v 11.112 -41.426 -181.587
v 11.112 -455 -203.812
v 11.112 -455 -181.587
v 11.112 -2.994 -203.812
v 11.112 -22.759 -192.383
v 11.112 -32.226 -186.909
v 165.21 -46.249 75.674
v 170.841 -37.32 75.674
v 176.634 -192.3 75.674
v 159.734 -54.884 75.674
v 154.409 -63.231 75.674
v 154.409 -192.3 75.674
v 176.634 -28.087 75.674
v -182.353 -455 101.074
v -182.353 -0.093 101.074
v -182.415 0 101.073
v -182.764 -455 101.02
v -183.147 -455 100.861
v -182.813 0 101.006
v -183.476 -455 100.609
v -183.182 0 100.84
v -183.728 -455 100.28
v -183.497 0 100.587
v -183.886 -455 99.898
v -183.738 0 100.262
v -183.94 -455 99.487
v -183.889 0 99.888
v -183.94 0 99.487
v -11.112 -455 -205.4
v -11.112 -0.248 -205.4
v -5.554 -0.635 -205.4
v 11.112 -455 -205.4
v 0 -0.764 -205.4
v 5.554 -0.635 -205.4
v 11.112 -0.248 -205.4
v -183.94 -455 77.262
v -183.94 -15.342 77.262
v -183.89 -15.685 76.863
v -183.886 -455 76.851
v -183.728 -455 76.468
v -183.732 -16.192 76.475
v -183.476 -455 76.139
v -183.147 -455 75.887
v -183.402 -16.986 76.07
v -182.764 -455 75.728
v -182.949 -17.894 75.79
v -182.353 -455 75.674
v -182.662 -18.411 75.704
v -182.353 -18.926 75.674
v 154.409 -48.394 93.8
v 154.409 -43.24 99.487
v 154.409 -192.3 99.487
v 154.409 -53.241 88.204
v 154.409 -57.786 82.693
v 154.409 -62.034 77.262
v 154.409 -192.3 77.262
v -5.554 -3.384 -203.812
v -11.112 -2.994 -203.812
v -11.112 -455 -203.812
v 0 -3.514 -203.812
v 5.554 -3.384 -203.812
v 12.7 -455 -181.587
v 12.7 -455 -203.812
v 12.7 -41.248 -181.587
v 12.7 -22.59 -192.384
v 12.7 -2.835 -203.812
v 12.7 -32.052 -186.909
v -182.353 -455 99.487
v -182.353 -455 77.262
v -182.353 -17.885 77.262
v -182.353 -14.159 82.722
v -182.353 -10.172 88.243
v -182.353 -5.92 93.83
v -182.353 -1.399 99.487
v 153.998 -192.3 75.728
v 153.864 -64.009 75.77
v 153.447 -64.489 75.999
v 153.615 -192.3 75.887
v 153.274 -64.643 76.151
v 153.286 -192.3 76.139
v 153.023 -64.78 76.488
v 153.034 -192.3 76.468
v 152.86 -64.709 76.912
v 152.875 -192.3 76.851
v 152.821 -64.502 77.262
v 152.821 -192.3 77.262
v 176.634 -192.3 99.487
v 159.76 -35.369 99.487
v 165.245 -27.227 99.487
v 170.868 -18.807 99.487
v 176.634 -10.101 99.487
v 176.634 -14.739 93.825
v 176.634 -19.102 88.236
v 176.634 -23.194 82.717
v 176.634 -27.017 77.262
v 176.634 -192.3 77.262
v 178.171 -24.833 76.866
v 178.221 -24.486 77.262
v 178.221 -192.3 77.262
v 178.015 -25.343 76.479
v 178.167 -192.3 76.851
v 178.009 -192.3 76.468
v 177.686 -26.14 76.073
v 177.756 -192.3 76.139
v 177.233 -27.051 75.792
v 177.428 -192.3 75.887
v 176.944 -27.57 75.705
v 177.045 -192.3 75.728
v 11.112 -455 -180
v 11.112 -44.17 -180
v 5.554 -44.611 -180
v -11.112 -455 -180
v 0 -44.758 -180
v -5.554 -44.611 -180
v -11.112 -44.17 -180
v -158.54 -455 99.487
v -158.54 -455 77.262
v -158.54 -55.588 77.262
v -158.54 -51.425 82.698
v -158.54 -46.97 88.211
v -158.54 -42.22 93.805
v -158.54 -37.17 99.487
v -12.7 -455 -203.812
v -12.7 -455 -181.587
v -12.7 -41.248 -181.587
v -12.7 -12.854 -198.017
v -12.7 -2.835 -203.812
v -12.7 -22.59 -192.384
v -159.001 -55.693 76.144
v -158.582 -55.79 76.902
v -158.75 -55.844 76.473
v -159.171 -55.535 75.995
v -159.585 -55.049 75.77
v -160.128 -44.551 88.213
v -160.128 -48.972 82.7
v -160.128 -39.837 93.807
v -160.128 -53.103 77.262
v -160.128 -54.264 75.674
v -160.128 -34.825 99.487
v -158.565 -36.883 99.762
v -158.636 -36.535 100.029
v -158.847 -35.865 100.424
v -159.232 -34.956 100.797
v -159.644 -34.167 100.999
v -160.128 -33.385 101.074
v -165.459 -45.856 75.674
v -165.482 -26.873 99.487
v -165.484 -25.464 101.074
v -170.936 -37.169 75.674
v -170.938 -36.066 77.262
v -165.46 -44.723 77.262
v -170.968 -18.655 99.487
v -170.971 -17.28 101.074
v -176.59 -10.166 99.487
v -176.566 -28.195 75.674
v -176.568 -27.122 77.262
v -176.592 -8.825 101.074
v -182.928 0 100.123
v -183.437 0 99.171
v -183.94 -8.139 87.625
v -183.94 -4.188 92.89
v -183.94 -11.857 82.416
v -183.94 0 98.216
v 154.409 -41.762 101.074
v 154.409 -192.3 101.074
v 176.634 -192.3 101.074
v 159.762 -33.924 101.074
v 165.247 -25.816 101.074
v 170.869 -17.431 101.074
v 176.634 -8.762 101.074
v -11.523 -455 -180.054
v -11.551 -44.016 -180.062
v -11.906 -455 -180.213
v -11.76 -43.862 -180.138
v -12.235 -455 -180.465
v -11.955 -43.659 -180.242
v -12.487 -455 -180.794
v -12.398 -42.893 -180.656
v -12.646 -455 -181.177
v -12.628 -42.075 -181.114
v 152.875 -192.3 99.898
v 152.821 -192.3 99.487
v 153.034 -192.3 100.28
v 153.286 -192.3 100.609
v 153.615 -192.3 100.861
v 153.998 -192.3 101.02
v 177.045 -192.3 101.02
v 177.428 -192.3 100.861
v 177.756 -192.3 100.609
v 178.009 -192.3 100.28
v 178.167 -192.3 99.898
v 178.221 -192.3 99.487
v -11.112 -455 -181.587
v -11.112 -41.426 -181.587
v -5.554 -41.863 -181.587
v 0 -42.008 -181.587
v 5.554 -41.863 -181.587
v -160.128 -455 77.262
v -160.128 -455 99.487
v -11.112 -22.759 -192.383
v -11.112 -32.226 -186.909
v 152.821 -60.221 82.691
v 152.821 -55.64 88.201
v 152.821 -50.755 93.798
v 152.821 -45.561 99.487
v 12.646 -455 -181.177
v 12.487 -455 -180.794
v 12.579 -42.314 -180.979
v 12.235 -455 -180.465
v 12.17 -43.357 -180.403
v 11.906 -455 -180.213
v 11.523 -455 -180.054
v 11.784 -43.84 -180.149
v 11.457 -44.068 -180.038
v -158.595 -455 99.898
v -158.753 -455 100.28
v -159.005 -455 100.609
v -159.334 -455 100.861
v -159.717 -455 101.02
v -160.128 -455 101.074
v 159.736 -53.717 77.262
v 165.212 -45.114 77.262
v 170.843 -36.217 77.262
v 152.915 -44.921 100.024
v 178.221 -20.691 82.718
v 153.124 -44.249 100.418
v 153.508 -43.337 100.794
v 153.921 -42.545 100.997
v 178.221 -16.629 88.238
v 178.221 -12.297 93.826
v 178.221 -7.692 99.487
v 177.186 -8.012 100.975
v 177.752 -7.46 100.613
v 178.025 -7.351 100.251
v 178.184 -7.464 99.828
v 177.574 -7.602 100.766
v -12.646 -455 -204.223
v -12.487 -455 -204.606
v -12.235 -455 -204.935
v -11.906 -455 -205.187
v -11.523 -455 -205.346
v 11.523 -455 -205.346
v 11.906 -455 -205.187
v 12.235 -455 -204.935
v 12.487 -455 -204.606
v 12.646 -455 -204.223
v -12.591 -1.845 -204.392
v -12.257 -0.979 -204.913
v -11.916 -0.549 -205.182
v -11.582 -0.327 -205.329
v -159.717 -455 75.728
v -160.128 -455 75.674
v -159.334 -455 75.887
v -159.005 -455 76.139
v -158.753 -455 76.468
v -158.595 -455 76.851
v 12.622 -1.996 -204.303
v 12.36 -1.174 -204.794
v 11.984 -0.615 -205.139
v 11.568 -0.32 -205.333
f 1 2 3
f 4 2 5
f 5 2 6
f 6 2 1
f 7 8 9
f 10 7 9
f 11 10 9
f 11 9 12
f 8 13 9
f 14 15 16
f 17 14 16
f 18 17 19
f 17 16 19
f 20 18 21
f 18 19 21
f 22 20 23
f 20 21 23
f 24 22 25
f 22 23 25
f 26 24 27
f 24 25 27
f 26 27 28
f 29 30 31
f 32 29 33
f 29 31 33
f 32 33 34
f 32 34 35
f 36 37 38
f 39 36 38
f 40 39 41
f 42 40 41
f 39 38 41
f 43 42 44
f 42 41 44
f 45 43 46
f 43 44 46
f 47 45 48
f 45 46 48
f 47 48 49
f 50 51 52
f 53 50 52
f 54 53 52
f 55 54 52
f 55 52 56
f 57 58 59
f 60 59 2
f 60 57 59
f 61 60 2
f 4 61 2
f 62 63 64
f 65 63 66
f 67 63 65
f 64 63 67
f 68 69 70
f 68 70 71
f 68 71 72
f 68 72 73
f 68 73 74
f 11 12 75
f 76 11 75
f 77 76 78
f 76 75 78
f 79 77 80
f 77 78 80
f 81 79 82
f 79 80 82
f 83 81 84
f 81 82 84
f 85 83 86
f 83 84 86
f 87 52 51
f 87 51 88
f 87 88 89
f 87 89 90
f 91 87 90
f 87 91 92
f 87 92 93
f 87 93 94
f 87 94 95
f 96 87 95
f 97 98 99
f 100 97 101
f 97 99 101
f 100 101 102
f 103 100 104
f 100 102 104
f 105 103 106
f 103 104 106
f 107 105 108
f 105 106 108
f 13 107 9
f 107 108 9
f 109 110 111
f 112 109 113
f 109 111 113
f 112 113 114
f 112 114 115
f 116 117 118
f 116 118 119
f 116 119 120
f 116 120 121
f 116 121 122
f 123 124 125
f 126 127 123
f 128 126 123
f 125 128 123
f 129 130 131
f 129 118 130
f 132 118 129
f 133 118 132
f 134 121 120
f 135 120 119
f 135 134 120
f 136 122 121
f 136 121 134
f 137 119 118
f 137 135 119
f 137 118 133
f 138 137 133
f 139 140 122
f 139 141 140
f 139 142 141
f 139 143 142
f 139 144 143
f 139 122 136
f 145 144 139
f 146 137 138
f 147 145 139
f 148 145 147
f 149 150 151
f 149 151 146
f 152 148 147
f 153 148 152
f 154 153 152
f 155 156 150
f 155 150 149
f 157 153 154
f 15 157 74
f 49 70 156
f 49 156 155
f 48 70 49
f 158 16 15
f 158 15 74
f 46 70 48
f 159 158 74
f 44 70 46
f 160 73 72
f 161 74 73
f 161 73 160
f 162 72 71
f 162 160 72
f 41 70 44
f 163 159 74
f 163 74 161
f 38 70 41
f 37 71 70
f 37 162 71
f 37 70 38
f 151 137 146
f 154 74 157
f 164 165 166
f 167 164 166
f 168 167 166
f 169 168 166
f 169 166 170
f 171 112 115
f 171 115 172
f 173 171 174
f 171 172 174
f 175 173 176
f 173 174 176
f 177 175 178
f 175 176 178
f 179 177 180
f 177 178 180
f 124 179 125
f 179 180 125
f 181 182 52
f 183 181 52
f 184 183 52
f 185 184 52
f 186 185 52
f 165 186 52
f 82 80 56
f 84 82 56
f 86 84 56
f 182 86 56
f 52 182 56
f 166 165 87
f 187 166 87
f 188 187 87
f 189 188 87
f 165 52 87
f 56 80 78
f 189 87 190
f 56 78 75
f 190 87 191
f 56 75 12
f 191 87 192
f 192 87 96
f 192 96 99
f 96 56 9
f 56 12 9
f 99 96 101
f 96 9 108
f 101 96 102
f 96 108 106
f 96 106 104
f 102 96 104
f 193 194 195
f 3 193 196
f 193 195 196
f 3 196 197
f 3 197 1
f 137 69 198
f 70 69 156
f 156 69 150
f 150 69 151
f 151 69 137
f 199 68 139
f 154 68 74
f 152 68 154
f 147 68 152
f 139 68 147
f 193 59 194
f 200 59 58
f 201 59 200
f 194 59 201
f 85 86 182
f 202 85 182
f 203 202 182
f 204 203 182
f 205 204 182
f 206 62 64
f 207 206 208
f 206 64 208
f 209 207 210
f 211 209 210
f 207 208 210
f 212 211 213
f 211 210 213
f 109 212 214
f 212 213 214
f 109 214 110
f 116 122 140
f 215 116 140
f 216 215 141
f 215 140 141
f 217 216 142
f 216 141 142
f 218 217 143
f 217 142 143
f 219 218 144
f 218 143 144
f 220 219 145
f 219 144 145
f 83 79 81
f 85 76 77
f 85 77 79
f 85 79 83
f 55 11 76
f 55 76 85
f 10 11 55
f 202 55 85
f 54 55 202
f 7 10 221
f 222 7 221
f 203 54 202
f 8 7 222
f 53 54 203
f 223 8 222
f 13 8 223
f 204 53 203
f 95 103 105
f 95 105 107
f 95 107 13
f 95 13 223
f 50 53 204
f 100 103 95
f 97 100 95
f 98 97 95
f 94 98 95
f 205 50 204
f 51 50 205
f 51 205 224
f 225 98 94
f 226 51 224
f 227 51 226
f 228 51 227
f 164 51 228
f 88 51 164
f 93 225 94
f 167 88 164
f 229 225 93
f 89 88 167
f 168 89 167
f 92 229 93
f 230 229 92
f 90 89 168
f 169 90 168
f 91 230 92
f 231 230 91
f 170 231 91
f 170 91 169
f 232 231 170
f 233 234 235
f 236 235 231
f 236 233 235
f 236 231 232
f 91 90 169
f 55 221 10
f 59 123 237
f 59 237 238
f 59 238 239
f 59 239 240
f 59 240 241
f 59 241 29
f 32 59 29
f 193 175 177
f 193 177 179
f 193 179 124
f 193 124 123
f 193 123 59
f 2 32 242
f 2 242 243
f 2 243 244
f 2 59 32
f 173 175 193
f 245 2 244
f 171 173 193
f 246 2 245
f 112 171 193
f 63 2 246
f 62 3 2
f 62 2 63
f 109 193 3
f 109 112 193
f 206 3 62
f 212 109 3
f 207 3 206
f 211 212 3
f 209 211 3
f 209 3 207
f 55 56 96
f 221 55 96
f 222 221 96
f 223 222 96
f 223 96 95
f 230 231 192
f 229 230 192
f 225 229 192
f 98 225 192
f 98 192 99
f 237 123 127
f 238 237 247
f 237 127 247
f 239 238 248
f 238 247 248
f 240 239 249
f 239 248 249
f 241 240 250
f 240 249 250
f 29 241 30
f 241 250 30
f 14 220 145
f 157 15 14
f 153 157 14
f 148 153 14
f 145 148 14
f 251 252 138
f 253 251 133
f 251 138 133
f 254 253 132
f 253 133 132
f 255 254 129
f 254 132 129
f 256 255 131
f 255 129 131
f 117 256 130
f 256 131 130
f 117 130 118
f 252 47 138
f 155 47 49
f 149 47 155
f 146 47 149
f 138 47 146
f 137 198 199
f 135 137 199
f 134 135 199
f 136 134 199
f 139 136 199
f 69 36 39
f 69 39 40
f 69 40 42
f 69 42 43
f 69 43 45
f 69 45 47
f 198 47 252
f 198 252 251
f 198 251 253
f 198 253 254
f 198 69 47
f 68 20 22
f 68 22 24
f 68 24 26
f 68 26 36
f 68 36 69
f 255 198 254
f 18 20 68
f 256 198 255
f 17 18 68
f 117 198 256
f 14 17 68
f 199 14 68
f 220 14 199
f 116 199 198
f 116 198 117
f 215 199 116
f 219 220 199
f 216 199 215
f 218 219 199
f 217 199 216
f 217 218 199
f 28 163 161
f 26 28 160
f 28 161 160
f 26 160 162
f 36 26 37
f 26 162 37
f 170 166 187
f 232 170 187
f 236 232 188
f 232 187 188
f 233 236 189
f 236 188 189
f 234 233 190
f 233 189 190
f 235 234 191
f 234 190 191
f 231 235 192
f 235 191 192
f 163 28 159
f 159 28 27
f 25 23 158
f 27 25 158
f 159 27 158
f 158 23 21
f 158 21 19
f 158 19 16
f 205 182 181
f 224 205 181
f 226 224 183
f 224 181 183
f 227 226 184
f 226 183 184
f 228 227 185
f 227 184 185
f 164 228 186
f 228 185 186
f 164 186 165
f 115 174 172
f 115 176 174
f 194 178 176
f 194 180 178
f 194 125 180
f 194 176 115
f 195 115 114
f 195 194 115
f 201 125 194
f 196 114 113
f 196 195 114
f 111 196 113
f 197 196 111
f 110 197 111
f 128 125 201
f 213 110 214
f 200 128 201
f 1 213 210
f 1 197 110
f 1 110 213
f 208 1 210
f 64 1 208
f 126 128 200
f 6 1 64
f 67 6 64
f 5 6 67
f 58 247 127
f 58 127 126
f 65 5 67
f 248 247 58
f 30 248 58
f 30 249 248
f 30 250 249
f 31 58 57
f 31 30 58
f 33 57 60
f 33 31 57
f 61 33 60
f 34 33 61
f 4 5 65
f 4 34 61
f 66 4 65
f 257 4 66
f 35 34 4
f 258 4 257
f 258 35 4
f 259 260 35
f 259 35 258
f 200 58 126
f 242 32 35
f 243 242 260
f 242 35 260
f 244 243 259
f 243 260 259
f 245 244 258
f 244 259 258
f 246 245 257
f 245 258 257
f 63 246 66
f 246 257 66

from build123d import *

# Parameters (mm, degrees)
CROQUIS11_W                   = 22.225
CROQUIS11_H                   = 22.225
TUBO_CUADRADA_1_X_1_1_DEPTH   = 455
CROQUIS11_ON_SEGMENT_2_W      = 22.225
CROQUIS11_ON_SEGMENT_2_H      = 22.225
TUBO_CUADRADA_1_X_1_1_2_DEPTH = 455
CROQUIS11_ON_SEGMENT_3_W      = 22.225
CROQUIS11_ON_SEGMENT_3_H      = 22.225
TUBO_CUADRADA_1_X_1_1_3_DEPTH = 455
CROQUIS14_W                   = 32.37721909
CROQUIS14_H                   = 31.982194398
CORTAR_EXTRUIR1_DEPTH         = 481
CROQUIS16_W                   = 22.225
CROQUIS16_H                   = 22.225
SALIENTE_EXTRUIR1_DEPTH       = 185


with BuildPart() as part:
    # Croquis11 → Tubo cuadrada 1 X 1(1) (new body)
    with BuildSketch(Plane(origin=(171.928790355, 0, 87.027472945), x_dir=(1, 0, 0), z_dir=(0, -1, 0))):
        with BuildLine():
            Line((11.1125, 12.7), (-11.1125, 12.7))
            ThreePointArc((-11.1125, 12.7), (-12.235032015, 12.235032015), (-12.7, 11.1125))
            Line((-12.7, 11.1125), (-12.7, -11.1125))
            ThreePointArc((-12.7, -11.1125), (-12.235032015, -12.235032015), (-11.1125, -12.7))
            Line((-11.1125, -12.7), (11.1125, -12.7))
            ThreePointArc((11.1125, -12.7), (12.235032015, -12.235032015), (12.7, -11.1125))
            Line((12.7, -11.1125), (12.7, 11.1125))
            ThreePointArc((12.7, 11.1125), (12.235032015, 12.235032015), (11.1125, 12.7))
        make_face()
        Rectangle(CROQUIS11_W, CROQUIS11_H, mode=Mode.SUBTRACT)
    extrude(amount=TUBO_CUADRADA_1_X_1_1_DEPTH)

    # Croquis14 → Cortar-Extruir1 (cut)
    with BuildSketch(Plane.XZ.offset(455)):
        with Locations((172.035359018, 86.366428401)):
            Rectangle(CROQUIS14_W, CROQUIS14_H)
    extrude(amount=-CORTAR_EXTRUIR1_DEPTH, mode=Mode.SUBTRACT)


with BuildPart() as body_2:
    # Croquis11 on segment 2 (carried to segment 2) → Tubo cuadrada 1 X 1_1 2 (new body)
    with BuildSketch(Plane(origin=(-171.240476171, 0, 88.37414396), x_dir=(1, 0, 0), z_dir=(0, -1, 0))):
        with BuildLine():
            Line((11.1125, 12.7), (-11.1125, 12.7))
            ThreePointArc((-11.1125, 12.7), (-12.235032015, 12.235032015), (-12.7, 11.1125))
            Line((-12.7, 11.1125), (-12.7, -11.1125))
            ThreePointArc((-12.7, -11.1125), (-12.235032015, -12.235032015), (-11.1125, -12.7))
            Line((-11.1125, -12.7), (11.1125, -12.7))
            ThreePointArc((11.1125, -12.7), (12.235032015, -12.235032015), (12.7, -11.1125))
            Line((12.7, -11.1125), (12.7, 11.1125))
            ThreePointArc((12.7, 11.1125), (12.235032015, 12.235032015), (11.1125, 12.7))
        make_face()
        Rectangle(CROQUIS11_ON_SEGMENT_2_W, CROQUIS11_ON_SEGMENT_2_H, mode=Mode.SUBTRACT)
    extrude(amount=TUBO_CUADRADA_1_X_1_1_2_DEPTH)


with BuildPart() as body_3:
    # Croquis11 on segment 3 (carried to segment 3) → Tubo cuadrada 1 X 1_1 3 (new body)
    with BuildSketch(Plane(origin=(0, 0, -192.7), x_dir=(1, 0, 0), z_dir=(0, -1, 0))):
        with BuildLine():
            Line((11.1125, 12.7), (-11.1125, 12.7))
            ThreePointArc((-11.1125, 12.7), (-12.235032015, 12.235032015), (-12.7, 11.1125))
            Line((-12.7, 11.1125), (-12.7, -11.1125))
            ThreePointArc((-12.7, -11.1125), (-12.235032015, -12.235032015), (-11.1125, -12.7))
            Line((-11.1125, -12.7), (11.1125, -12.7))
            ThreePointArc((11.1125, -12.7), (12.235032015, -12.235032015), (12.7, -11.1125))
            Line((12.7, -11.1125), (12.7, 11.1125))
            ThreePointArc((12.7, 11.1125), (12.235032015, 12.235032015), (11.1125, 12.7))
        make_face()
        Rectangle(CROQUIS11_ON_SEGMENT_3_W, CROQUIS11_ON_SEGMENT_3_H, mode=Mode.SUBTRACT)
    extrude(amount=TUBO_CUADRADA_1_X_1_1_3_DEPTH)


with BuildPart() as body_3_2:
    # Croquis16 → Saliente-Extruir1 (new body)
    with BuildSketch(Plane(origin=(0, -192.3, 0), x_dir=(1, 0, 0), z_dir=(0, 1, 0))):
        with BuildLine():
            Line((176.633769577, -75.67414396), (154.408769577, -75.67414396))
            ThreePointArc((154.408769577, -75.67414396), (153.286237562, -76.139111945), (152.821269577, -77.26164396))
            Line((152.821269577, -77.26164396), (152.821269577, -99.48664396))
            ThreePointArc((152.821269577, -99.48664396), (153.286237562, -100.609175975), (154.408769577, -101.07414396))
            Line((154.408769577, -101.07414396), (176.633769577, -101.07414396))
            ThreePointArc((176.633769577, -101.07414396), (177.756301592, -100.609175975), (178.221269577, -99.48664396))
            Line((178.221269577, -99.48664396), (178.221269577, -77.26164396))
            ThreePointArc((178.221269577, -77.26164396), (177.756301592, -76.139111945), (176.633769577, -75.67414396))
        make_face()
        with Locations((165.521269577, -88.37414396)):
            Rectangle(CROQUIS16_W, CROQUIS16_H, mode=Mode.SUBTRACT)
    extrude(amount=SALIENTE_EXTRUIR1_DEPTH)


with BuildPart() as cortar_revoluci_n1_tool:
    # Croquis13 → Cortar-Revolución1 (revolve)
    with BuildSketch(Plane.XY.offset(1.825232316)):
        Polygon((0, 0), (0, -359.688544551), (-207.666278021, 0), align=None)
    revolve(axis=Axis((0, 0, 1.825232316), (0, -1, 0)))


with BuildPart() as body_2_1:
    add(body_2.part)

    # Cortar-Revolución1: cut by cortar_revoluci_n1_tool
    add(cortar_revoluci_n1_tool.part, mode=Mode.SUBTRACT)


with BuildPart() as body_3_1:
    add(body_3.part)

    # Cortar-Revolución1: cut by cortar_revoluci_n1_tool
    add(cortar_revoluci_n1_tool.part, mode=Mode.SUBTRACT)


with BuildPart() as body_3_2_1:
    add(body_3_2.part)

    # Cortar-Revolución1: cut by cortar_revoluci_n1_tool
    add(cortar_revoluci_n1_tool.part, mode=Mode.SUBTRACT)


solid = Compound([body_2_1.part, body_3_1.part, body_3_2_1.part])
